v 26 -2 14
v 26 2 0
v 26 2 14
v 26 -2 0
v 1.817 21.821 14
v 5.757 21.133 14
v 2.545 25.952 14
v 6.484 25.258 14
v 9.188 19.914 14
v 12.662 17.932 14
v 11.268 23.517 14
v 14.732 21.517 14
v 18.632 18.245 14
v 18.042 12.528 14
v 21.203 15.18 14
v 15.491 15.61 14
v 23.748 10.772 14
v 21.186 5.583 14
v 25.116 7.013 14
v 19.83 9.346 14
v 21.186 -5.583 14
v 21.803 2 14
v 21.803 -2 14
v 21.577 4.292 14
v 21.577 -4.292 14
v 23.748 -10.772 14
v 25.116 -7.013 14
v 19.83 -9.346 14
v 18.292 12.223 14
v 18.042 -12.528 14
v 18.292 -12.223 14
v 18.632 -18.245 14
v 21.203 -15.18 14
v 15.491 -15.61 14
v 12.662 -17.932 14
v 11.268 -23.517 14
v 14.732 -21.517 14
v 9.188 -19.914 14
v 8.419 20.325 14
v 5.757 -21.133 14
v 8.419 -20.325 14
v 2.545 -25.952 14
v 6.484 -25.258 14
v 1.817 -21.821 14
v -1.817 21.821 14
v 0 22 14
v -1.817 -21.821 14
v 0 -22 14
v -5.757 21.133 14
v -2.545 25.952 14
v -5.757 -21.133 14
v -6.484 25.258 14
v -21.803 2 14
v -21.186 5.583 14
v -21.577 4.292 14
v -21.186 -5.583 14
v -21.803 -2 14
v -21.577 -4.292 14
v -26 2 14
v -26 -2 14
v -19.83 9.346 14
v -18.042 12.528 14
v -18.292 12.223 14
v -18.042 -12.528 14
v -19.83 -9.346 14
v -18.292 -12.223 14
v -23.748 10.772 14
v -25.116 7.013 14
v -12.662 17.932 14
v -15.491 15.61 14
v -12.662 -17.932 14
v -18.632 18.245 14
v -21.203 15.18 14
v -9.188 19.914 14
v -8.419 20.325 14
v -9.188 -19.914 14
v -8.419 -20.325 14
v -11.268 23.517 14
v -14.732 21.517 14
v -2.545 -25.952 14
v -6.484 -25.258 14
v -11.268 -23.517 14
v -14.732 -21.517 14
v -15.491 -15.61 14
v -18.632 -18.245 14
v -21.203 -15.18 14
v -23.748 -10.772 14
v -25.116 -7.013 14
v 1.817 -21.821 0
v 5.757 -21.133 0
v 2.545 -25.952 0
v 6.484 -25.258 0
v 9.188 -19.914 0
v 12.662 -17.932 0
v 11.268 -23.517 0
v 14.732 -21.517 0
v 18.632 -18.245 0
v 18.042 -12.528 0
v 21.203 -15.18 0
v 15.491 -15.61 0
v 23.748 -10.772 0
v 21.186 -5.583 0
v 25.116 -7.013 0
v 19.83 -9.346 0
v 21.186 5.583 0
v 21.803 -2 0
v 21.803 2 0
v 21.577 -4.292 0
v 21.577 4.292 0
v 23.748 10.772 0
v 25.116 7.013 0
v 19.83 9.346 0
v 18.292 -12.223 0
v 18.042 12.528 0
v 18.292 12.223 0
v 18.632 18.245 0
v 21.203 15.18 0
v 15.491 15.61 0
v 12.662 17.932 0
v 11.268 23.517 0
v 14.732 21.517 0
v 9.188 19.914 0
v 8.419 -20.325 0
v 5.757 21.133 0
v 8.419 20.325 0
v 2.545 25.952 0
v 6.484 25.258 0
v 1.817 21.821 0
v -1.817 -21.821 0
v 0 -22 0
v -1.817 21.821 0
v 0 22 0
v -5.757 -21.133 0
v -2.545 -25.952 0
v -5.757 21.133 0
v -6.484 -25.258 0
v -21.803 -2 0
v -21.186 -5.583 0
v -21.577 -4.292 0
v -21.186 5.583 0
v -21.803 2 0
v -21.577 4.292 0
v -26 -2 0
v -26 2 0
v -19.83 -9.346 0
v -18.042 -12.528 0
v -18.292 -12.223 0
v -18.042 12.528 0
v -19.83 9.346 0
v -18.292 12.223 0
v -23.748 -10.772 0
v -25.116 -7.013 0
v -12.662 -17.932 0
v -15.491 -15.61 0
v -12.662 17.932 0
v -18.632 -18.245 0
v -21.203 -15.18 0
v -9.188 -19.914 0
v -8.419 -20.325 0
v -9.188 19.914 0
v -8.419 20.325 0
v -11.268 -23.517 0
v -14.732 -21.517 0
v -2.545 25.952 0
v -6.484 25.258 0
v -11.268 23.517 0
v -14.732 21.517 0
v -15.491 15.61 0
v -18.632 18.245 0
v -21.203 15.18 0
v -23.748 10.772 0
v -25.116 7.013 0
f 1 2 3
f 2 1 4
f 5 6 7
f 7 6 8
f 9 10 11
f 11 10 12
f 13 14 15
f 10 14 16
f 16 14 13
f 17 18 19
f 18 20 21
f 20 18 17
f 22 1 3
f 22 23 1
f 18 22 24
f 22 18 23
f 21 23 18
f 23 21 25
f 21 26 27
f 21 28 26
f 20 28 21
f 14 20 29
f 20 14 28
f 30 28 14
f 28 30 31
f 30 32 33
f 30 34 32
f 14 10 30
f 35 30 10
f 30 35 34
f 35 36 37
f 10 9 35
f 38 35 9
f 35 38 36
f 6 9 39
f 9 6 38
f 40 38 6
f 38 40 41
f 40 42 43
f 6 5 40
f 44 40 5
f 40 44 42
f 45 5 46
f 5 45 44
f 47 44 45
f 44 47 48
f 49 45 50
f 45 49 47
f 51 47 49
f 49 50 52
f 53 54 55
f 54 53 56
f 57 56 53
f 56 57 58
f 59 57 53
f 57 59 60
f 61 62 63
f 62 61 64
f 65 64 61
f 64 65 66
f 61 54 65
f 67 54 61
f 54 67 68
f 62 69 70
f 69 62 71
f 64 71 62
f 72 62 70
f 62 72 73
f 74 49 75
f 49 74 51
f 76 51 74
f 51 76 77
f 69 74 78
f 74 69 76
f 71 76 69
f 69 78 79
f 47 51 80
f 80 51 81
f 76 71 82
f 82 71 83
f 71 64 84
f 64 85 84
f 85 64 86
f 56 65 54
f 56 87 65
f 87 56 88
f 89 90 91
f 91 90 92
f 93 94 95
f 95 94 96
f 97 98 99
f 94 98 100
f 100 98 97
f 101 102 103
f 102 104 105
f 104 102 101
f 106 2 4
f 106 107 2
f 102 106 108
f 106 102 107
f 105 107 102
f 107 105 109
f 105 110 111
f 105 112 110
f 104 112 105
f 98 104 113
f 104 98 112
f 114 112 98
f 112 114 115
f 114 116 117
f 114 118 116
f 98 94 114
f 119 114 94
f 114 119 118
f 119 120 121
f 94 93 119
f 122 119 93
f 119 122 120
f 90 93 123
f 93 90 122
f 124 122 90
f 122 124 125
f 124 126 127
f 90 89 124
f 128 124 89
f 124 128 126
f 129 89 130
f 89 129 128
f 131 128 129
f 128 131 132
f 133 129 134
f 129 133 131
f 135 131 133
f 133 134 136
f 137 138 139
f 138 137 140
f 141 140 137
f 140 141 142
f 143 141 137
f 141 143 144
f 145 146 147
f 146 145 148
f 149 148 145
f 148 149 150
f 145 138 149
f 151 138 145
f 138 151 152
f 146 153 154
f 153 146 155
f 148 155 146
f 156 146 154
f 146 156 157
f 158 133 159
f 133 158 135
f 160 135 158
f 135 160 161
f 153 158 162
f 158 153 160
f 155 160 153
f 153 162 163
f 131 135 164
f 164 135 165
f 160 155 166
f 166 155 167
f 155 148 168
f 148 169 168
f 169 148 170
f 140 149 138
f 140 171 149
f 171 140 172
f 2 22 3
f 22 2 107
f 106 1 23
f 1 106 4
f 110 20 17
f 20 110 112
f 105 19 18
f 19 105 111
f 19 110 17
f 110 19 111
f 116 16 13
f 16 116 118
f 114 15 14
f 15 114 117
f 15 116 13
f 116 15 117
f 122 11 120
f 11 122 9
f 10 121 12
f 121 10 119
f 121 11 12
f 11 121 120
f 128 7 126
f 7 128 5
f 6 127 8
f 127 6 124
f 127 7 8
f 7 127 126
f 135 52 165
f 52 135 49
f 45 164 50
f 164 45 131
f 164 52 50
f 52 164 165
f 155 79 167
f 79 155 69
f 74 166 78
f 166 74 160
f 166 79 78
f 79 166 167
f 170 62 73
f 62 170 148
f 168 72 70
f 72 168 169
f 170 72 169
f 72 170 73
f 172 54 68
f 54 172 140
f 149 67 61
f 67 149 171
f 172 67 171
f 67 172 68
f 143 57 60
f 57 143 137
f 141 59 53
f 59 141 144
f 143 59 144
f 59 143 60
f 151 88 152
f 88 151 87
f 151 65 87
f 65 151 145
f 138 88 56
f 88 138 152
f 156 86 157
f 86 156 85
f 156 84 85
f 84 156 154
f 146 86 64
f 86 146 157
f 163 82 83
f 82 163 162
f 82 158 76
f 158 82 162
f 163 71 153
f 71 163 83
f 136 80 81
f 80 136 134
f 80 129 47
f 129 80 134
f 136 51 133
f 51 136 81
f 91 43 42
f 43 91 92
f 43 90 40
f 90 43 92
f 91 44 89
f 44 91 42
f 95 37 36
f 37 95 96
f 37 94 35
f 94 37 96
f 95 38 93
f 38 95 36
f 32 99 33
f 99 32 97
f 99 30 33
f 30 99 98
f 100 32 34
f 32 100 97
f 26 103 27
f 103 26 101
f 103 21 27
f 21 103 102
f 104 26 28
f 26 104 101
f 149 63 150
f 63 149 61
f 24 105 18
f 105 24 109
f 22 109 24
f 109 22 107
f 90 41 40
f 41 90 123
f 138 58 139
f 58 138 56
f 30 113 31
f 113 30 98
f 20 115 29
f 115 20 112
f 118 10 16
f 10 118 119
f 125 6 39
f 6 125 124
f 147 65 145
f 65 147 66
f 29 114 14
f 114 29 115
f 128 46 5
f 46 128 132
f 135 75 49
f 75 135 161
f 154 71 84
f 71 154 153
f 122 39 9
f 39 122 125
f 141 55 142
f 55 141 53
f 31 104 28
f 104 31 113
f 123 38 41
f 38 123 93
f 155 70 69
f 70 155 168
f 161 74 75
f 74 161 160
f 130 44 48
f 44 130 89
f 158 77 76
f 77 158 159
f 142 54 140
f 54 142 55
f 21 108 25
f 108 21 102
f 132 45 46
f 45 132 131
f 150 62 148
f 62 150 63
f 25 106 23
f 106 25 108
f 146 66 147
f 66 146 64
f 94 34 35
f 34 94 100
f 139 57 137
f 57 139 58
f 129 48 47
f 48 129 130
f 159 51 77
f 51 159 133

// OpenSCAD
$fn = 32;

// ----------------------------------------------------------------------
// Spur blank: plain gear blank
// ----------------------------------------------------------------------

// --- parameters (mm) ---
disc_r = 22;              // blank root radius
disc_t = 14;              // blank thickness
n_teeth = 18;             // stub tooth count
tooth_w = 4;              // tooth width at the root
tooth_h = 4;              // tooth height above the root

out_r = disc_r + tooth_h;  // tip radius
bbox_x = 52.0;  // measured width over the teeth
bbox_y = 51.9;  // measured depth over the teeth

union() {
  cylinder(r = disc_r, h = disc_t);
  for (i = [0 : n_teeth - 1])
    rotate([0, 0, i * 360 / n_teeth])
      translate([disc_r - 1, -tooth_w / 2, 0])
        cube([tooth_h + 1, tooth_w, disc_t]);
}
